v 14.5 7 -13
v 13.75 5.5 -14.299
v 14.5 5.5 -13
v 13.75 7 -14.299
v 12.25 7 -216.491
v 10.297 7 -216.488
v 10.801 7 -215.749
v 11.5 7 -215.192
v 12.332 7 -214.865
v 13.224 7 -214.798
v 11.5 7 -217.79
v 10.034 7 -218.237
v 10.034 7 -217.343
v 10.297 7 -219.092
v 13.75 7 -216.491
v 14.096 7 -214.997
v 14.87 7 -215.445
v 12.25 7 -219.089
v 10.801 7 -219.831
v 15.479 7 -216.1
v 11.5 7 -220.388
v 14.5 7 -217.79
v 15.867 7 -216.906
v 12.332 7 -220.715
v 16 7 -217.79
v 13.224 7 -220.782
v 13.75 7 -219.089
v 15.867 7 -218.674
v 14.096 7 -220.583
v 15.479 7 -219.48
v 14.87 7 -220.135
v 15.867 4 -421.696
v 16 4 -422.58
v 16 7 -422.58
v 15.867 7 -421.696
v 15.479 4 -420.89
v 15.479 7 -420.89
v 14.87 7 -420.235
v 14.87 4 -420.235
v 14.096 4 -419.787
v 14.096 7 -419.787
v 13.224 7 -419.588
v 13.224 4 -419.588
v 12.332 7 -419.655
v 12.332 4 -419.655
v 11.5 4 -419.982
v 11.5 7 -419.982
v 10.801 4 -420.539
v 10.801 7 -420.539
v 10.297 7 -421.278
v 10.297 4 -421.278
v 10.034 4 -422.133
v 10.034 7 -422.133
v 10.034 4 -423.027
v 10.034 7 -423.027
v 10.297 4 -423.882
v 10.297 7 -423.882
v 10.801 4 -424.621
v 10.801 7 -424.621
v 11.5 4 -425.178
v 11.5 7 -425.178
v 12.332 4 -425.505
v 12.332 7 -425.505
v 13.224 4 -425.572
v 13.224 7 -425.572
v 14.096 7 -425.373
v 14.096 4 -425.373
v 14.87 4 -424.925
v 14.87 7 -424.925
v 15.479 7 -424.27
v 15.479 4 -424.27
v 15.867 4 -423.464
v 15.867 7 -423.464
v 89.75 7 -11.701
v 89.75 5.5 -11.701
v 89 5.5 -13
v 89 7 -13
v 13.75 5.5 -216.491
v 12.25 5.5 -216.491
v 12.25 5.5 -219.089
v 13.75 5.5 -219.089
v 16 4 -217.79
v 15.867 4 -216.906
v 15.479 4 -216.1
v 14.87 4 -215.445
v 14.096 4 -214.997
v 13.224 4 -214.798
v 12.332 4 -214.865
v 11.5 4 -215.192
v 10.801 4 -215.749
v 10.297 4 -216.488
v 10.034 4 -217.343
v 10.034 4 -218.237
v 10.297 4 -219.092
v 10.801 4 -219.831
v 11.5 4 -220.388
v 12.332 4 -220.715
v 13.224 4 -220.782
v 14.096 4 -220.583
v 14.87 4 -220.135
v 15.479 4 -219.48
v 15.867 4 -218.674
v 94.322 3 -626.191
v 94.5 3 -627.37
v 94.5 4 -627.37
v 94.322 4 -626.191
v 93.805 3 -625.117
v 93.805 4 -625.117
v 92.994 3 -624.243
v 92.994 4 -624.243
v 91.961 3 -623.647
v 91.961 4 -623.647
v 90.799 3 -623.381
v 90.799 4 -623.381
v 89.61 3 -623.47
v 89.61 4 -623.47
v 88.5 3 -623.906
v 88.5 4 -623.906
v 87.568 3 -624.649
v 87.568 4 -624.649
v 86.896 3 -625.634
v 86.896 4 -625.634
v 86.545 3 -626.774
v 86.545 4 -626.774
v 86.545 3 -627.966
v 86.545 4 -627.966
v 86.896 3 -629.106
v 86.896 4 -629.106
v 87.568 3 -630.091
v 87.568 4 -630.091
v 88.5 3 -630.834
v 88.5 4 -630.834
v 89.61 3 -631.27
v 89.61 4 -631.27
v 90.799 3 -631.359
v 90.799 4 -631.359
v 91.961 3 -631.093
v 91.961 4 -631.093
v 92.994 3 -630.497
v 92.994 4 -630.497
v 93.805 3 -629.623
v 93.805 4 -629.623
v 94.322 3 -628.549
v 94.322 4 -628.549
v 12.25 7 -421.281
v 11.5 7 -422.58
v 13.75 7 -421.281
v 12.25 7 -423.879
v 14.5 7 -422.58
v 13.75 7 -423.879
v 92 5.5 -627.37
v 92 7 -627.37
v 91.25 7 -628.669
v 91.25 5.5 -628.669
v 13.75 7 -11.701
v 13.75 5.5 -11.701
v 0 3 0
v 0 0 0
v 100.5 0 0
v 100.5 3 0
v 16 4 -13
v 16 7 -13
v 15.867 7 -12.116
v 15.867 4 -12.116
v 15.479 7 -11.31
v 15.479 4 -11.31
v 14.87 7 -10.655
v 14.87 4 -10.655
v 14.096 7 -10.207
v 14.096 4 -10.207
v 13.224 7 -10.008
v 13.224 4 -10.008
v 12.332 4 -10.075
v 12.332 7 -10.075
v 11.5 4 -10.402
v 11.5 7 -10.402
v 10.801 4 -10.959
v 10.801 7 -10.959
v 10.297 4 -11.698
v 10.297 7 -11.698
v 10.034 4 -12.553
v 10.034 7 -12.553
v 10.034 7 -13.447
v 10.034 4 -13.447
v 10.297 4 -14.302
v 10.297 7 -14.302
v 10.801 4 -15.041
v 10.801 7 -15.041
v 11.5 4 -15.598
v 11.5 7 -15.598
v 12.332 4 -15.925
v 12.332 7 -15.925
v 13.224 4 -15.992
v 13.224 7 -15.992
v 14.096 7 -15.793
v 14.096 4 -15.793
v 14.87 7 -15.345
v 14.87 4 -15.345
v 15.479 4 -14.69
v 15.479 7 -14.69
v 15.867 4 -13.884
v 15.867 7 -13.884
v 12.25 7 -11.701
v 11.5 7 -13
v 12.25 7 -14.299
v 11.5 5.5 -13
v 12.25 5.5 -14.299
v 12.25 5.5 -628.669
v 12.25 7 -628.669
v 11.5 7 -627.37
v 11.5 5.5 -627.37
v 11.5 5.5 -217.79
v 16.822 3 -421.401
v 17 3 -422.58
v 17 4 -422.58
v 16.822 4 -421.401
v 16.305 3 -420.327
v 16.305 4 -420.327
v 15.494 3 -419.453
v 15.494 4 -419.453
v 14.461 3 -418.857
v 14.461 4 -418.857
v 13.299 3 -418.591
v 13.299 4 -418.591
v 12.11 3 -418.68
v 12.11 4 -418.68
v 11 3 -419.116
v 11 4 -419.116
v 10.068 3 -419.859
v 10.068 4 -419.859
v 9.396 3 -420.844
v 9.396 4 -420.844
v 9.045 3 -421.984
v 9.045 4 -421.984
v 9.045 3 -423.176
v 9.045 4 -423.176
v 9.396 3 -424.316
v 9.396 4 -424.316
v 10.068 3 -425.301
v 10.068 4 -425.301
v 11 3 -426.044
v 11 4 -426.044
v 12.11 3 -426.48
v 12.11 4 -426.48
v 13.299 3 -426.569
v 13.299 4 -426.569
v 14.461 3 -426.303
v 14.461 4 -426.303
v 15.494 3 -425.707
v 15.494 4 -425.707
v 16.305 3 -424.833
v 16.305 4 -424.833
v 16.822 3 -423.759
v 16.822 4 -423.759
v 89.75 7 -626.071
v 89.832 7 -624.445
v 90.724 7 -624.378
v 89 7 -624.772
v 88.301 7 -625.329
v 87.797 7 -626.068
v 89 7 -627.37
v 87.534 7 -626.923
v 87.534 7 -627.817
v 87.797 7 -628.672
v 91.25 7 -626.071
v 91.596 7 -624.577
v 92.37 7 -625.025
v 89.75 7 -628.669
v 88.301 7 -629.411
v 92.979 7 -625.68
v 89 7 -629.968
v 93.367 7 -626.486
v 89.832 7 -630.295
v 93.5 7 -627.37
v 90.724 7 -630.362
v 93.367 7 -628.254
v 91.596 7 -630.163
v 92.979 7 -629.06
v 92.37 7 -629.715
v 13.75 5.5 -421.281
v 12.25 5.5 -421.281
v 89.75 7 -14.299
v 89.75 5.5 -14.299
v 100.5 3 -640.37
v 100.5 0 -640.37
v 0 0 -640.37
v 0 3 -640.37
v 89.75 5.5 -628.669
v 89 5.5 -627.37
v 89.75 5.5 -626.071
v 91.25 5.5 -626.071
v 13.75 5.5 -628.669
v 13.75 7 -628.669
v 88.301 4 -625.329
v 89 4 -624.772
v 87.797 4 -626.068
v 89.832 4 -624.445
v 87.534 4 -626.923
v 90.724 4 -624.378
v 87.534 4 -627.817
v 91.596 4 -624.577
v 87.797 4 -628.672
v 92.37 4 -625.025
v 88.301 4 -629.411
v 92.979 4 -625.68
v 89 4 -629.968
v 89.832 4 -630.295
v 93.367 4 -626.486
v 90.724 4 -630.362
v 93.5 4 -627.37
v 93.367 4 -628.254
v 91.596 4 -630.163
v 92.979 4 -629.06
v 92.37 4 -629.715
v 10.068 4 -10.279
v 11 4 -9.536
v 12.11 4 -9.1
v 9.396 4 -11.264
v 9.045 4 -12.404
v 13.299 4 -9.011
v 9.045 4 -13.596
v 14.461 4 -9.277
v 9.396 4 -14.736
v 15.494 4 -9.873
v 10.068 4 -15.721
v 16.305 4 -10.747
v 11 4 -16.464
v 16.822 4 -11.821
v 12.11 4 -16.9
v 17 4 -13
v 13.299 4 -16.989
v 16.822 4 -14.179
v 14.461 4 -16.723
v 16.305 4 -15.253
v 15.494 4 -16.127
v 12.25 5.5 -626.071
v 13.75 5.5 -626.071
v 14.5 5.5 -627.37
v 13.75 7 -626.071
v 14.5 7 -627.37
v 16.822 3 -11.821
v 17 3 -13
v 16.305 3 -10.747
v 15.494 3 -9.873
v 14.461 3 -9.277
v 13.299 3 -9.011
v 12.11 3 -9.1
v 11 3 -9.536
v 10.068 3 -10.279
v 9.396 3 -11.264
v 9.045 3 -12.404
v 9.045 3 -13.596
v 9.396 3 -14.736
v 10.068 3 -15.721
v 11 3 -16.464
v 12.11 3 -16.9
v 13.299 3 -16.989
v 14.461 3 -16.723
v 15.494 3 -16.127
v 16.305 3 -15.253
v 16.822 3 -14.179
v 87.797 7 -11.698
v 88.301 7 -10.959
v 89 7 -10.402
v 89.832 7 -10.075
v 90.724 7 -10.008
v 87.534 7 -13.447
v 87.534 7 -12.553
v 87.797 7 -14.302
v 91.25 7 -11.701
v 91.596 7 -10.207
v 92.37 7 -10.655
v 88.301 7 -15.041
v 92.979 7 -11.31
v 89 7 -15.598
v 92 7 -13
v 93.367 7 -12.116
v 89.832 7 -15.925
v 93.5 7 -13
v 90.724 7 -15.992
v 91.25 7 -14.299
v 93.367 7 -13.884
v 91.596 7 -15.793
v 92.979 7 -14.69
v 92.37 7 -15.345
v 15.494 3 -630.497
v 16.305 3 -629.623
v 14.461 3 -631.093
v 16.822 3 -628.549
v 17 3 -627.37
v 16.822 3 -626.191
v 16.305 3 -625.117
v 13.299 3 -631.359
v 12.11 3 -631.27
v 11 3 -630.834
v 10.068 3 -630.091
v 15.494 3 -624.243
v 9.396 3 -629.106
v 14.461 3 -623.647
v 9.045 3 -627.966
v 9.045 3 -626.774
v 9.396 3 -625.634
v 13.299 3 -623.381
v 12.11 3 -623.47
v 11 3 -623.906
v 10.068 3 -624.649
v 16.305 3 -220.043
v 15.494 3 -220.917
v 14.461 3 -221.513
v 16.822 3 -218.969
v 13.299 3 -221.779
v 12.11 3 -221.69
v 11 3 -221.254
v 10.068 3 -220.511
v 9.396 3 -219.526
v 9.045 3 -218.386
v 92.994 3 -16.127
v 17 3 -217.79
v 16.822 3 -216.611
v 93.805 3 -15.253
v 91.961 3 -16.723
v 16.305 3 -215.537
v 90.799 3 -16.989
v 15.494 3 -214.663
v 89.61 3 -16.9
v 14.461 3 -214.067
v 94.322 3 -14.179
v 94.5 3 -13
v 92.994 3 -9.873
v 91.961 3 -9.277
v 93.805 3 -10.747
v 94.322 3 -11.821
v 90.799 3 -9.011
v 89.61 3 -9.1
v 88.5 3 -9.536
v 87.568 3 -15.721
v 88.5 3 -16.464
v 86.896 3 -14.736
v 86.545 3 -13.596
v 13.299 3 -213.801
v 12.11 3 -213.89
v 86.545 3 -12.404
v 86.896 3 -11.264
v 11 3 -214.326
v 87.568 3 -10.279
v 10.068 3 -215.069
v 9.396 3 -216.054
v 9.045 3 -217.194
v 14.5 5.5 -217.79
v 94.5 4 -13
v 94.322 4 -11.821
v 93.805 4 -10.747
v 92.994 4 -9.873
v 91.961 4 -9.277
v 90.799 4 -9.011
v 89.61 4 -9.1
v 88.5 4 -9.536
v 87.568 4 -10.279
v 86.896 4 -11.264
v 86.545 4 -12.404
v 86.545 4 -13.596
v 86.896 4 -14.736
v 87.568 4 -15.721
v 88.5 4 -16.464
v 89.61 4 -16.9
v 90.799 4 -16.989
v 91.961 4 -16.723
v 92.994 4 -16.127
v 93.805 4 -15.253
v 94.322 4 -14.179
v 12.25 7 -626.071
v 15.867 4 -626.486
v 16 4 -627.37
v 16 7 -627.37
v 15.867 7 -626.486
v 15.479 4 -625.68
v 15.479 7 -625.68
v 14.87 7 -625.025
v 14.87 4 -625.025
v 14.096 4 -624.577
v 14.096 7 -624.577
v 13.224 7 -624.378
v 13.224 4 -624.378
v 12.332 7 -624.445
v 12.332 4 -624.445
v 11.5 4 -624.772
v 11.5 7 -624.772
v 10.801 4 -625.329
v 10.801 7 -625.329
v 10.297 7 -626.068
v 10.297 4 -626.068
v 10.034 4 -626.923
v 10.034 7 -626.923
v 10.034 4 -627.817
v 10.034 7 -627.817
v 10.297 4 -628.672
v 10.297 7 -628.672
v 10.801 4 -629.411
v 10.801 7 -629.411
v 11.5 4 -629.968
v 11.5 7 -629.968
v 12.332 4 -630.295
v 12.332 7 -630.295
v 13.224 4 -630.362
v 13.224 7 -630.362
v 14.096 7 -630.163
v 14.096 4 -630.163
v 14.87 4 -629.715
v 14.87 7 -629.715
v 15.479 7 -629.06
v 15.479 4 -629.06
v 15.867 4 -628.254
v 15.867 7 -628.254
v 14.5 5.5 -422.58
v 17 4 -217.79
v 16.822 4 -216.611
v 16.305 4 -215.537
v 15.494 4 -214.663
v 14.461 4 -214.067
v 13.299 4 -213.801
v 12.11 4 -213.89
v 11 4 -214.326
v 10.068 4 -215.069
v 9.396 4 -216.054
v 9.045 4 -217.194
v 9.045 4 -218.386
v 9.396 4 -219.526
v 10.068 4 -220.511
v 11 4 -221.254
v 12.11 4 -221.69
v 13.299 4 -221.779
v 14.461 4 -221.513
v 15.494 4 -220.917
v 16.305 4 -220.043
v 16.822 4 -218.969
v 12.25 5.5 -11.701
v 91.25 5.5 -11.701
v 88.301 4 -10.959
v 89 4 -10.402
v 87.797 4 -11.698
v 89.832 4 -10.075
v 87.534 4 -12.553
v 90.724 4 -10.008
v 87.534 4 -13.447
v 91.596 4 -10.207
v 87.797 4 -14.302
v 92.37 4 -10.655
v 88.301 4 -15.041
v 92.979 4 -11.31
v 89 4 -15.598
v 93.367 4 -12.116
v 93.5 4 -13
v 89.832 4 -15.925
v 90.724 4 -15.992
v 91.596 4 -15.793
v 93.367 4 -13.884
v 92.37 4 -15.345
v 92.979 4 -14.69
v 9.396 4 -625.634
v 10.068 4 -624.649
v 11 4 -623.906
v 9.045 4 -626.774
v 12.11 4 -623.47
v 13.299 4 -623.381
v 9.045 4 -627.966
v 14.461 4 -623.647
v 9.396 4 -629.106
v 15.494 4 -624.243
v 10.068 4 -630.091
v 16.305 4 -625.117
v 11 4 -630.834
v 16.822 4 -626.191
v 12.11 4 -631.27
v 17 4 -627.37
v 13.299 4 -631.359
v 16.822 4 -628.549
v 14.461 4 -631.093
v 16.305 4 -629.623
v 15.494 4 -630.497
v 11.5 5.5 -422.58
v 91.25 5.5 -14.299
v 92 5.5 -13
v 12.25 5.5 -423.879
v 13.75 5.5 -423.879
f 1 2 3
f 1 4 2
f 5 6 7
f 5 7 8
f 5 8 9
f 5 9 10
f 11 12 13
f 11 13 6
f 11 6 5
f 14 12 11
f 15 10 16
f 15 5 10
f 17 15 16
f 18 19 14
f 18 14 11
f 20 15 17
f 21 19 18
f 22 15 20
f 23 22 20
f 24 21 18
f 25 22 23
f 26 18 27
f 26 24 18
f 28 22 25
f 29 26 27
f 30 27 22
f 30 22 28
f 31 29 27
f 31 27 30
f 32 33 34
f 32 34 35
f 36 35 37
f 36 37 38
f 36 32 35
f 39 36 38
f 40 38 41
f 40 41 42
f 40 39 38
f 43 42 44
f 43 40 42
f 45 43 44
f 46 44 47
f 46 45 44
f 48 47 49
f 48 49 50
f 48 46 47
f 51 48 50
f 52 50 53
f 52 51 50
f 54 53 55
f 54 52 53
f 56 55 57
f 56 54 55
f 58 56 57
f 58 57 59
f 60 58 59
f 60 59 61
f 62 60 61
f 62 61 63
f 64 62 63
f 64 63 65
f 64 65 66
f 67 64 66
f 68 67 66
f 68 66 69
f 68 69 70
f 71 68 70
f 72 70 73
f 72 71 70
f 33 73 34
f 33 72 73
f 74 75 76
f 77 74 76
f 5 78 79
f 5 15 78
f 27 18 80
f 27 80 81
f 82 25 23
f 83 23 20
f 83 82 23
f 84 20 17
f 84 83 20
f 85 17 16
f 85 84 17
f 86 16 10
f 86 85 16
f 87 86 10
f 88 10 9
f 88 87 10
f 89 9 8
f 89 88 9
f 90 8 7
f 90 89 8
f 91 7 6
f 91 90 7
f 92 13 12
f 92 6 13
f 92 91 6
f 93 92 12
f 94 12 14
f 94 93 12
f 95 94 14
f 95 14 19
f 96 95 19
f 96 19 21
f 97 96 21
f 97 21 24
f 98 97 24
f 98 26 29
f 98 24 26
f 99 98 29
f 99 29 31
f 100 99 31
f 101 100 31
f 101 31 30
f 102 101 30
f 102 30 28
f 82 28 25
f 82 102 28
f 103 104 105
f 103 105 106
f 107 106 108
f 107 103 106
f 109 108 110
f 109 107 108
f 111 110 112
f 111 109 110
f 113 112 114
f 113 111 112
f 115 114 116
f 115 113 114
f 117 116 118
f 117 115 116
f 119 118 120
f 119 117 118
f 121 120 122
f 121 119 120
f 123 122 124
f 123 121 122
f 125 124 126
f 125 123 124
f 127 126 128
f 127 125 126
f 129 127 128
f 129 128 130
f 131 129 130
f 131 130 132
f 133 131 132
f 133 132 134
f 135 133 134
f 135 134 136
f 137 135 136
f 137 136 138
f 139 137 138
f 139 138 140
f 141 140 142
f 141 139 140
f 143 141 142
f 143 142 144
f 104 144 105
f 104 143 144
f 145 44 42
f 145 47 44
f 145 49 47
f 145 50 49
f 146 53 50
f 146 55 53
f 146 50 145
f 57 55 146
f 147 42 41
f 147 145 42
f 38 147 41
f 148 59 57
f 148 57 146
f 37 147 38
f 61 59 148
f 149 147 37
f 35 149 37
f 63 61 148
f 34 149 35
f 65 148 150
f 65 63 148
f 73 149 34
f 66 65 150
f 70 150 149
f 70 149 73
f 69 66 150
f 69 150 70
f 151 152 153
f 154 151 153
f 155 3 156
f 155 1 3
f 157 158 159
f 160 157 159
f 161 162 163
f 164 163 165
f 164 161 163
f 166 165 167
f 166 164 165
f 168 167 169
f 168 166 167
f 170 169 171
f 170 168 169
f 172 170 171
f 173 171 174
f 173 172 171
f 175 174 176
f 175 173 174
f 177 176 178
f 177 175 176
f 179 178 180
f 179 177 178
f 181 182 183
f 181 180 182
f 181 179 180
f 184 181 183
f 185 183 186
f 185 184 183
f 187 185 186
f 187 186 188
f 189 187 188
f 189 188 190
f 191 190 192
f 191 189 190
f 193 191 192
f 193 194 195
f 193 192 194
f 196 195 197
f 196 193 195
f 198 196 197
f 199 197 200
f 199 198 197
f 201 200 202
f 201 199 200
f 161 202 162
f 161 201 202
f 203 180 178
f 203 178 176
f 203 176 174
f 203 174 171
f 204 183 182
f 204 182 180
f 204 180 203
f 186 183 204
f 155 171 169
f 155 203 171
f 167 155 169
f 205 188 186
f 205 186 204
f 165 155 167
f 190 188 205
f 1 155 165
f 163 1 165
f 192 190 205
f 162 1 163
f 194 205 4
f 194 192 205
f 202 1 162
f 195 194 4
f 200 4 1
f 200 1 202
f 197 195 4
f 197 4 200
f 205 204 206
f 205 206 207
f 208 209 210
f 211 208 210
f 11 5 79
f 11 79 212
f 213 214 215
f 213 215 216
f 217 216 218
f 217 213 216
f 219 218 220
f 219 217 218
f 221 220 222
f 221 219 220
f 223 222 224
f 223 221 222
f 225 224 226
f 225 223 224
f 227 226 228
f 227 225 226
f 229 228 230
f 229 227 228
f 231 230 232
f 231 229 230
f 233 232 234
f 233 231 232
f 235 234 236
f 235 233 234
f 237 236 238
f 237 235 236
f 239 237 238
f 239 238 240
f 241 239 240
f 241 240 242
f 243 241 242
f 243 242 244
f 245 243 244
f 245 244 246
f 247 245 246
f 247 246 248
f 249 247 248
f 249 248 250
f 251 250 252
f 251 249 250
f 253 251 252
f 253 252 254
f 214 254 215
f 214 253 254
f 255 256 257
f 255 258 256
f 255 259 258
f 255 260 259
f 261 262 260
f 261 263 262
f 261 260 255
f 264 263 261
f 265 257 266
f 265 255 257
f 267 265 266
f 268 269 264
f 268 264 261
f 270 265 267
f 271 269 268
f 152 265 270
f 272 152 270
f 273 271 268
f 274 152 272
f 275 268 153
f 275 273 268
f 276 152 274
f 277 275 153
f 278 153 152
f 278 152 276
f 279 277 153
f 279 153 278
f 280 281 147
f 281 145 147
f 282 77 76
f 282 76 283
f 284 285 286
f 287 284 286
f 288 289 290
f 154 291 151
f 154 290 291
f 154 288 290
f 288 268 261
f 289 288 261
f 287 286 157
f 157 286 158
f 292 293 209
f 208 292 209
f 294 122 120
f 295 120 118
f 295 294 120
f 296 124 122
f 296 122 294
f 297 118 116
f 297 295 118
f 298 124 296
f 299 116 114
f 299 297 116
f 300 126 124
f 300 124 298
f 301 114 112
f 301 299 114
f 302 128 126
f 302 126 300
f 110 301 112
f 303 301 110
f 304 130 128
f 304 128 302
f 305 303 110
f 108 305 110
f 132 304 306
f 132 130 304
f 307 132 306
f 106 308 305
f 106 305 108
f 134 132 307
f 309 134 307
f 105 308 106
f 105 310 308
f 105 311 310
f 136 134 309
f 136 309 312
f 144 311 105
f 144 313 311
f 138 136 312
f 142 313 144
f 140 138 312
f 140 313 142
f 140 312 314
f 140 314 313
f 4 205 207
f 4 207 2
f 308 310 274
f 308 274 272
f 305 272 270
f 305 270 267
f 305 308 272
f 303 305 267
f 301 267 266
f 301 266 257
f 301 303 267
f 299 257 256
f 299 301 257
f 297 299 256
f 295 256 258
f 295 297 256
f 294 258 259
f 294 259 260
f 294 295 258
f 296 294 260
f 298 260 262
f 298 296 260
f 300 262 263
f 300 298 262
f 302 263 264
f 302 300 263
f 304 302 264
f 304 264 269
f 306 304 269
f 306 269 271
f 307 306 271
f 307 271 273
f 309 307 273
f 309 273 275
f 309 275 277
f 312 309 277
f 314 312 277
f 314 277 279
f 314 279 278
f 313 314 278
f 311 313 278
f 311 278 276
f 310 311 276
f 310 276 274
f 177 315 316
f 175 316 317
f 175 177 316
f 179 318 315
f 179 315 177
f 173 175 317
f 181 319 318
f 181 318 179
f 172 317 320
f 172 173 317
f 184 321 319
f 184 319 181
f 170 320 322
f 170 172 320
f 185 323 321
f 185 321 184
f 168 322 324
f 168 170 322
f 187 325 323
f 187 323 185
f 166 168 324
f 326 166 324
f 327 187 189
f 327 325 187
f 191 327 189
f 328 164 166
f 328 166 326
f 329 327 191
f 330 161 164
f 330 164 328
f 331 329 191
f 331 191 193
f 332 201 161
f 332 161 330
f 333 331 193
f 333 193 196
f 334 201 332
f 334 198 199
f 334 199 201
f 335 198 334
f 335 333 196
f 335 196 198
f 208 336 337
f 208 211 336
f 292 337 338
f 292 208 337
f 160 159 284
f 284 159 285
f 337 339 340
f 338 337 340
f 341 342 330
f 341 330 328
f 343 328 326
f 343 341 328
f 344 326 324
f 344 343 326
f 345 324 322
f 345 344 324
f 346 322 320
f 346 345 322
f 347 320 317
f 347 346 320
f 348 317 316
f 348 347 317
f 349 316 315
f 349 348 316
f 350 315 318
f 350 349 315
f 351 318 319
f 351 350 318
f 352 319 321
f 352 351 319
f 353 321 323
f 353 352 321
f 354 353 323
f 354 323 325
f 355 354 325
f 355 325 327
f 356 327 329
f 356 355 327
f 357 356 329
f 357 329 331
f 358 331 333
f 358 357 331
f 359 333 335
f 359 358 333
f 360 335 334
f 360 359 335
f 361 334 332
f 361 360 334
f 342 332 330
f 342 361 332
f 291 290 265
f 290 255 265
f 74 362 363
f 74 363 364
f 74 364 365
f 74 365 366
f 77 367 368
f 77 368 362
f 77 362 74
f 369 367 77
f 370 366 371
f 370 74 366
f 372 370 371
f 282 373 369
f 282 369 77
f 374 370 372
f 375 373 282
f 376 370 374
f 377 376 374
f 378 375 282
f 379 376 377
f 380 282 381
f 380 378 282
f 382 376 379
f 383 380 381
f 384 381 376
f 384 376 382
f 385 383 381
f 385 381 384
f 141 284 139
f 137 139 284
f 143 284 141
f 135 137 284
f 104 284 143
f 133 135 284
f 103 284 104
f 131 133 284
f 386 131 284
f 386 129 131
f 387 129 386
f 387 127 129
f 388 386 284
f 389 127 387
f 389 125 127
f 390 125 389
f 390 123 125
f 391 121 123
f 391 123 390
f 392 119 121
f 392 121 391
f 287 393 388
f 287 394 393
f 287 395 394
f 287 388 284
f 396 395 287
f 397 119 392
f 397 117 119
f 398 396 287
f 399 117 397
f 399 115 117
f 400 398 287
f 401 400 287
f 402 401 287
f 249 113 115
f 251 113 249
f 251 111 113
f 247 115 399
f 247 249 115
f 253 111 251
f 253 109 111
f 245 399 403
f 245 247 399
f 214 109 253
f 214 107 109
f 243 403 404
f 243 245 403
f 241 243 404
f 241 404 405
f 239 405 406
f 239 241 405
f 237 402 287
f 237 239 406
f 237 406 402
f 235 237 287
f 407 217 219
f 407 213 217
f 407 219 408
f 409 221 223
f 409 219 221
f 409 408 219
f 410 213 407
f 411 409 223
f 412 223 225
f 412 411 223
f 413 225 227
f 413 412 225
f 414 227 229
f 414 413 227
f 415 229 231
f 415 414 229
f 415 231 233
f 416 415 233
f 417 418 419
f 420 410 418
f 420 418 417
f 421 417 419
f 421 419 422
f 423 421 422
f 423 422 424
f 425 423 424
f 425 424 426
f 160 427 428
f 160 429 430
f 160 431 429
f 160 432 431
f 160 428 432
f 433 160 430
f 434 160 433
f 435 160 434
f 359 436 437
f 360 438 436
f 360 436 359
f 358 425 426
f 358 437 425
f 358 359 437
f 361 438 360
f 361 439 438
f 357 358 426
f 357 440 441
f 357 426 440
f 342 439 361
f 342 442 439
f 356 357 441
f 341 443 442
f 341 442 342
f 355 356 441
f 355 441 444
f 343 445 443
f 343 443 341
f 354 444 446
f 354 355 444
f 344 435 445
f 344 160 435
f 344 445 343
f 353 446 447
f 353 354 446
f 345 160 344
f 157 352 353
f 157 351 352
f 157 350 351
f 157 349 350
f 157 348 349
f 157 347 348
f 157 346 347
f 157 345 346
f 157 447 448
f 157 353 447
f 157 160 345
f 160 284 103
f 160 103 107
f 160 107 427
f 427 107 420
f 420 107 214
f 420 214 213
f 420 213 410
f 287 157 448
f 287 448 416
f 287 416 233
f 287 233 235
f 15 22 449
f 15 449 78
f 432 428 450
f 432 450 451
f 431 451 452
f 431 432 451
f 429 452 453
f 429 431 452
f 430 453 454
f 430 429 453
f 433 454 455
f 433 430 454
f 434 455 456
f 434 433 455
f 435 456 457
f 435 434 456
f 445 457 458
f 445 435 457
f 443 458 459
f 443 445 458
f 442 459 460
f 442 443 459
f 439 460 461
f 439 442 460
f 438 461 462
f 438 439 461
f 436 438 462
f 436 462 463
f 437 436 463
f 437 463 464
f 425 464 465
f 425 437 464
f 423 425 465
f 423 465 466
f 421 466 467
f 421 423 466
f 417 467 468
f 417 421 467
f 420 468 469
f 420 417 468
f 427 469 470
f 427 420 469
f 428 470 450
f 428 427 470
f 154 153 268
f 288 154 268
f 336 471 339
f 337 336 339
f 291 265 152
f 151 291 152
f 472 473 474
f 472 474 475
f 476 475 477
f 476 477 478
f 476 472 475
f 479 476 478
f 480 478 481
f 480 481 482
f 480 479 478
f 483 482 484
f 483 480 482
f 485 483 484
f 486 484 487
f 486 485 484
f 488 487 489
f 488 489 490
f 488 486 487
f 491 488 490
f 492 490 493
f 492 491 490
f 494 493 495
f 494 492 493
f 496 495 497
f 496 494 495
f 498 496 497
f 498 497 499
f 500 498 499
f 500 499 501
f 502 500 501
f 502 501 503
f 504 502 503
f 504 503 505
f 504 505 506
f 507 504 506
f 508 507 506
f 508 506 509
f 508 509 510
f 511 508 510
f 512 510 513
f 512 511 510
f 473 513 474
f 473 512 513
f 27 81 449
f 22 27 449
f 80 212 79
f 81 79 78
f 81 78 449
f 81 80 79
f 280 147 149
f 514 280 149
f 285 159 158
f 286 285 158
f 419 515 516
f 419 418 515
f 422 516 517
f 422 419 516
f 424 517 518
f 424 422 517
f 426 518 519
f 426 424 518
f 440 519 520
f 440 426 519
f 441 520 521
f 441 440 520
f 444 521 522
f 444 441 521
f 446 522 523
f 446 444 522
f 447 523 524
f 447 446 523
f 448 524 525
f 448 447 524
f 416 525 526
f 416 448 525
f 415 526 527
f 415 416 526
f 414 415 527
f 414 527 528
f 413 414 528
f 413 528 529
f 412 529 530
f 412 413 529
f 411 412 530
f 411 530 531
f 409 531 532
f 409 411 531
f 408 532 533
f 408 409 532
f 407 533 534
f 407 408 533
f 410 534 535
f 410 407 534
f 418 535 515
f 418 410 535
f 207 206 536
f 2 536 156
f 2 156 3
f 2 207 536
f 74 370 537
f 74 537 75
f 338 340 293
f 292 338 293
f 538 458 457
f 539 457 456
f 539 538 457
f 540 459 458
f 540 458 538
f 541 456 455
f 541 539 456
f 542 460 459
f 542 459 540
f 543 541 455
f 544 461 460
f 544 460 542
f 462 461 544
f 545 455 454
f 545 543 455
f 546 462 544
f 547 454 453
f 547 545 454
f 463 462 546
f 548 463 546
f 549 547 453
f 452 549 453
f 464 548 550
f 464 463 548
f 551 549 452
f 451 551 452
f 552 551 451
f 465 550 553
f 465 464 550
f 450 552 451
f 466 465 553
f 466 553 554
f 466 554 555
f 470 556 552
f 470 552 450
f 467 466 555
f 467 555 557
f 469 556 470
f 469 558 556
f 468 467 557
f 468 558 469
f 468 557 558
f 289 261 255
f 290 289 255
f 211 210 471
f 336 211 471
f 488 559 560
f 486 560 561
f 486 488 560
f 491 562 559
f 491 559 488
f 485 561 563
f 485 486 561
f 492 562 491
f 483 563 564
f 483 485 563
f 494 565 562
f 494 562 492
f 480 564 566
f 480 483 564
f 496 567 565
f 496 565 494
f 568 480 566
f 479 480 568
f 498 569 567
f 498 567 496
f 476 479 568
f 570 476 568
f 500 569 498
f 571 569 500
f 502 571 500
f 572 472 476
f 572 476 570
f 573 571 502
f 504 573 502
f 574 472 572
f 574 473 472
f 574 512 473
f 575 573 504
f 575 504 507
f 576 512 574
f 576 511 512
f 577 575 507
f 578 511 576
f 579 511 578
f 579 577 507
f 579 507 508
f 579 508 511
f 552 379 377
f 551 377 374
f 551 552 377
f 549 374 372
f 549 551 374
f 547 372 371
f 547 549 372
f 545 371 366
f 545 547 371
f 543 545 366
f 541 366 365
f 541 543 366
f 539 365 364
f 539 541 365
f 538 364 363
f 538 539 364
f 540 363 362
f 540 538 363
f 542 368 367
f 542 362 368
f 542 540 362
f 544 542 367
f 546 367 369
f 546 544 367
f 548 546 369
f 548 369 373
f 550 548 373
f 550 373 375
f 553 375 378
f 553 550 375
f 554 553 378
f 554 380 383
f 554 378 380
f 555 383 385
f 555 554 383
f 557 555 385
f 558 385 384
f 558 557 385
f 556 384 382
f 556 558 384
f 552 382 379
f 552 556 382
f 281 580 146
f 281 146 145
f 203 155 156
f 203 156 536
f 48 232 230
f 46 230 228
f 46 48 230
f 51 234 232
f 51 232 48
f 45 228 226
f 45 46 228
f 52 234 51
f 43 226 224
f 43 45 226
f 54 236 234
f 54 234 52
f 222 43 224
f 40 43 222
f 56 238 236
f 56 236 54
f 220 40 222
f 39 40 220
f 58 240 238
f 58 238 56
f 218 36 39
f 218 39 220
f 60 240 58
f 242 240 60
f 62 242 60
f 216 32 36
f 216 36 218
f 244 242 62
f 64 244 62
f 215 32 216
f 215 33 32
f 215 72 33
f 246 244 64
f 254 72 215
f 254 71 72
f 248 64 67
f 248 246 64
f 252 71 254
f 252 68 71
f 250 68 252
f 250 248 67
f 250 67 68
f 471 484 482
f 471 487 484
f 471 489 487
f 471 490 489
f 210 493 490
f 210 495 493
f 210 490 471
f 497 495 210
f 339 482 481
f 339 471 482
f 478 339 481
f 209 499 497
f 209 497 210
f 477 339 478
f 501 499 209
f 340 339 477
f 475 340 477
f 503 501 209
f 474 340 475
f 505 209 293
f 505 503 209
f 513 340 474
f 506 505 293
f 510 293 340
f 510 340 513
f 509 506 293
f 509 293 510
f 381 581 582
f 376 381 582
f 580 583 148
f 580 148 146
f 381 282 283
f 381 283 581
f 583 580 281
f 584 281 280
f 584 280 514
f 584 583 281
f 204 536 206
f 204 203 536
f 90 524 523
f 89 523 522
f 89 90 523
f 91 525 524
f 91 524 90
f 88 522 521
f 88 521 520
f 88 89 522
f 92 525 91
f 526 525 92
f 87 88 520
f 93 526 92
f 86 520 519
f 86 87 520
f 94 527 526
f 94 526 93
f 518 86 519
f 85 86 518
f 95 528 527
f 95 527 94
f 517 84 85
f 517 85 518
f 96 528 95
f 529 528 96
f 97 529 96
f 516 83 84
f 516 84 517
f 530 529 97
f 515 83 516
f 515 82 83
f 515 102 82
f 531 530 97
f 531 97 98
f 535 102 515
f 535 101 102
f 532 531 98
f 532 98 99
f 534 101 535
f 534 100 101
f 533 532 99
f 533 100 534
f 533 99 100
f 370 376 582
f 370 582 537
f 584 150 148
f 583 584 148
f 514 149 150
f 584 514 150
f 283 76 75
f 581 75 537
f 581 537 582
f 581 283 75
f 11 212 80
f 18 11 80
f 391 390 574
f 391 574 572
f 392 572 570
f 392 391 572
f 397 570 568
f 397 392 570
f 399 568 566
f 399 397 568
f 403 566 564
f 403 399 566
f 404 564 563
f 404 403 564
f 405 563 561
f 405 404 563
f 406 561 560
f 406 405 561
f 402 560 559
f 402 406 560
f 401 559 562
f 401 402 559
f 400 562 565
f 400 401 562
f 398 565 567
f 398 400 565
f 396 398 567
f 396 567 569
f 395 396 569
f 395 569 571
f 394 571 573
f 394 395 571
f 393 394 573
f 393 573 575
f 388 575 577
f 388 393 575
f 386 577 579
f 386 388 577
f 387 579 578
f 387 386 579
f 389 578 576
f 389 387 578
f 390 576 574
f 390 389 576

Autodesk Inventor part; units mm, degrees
ref_plane "YZ Plane" through (0, 0, 0) normal (1, 0, 0) x (0, 1, 0)
ref_plane "XZ Plane" through (0, 0, 0) normal (0, 1, 0) x (-1, 0, 0)
ref_plane "XY Plane" through (0, 0, 0) normal (0, 0, 1) x (1, 0, 0)
sketch "Esboço1" plane through (0, 0, 0) normal (0, 1, 0) x (-1, 0, 0)
  line L0 (0, 0) -> (-100.5, 0)
  line L1 (-100.5, 0) -> (-100.5, -640.37)
  line L2 (-100.5, -640.37) -> (0, -640.37)
  line L3 (0, -640.37) -> (0, 0)
  dimension "d0" = 100.5
  dimension "d1" = 640.37
extrude "Extrusão1" add sketch "Esboço1" along normal blind 3
sketch "Esboço2" plane through (0, 3, 0) normal (0, 1, 0) x (1, 0, 0)
  line L0 (0, 0) -> (100.5, 0) projected
  line L1 (0, 0) -> (100.5, 0)
  line L2 (0, 20) -> (0, 0)
  line L3 (100.5, 640.37) -> (0, 640.37) projected
  line L4 (0, 0) -> (23, 0)
  line L5 (23, 0) -> (23, 640.37)
  line L6 (23, 640.37) -> (0, 640.37)
  line L7 (0, 640.37) -> (0, 0)
  line L8 (0, 640.37) -> (3, 640.37)
  line L9 (3, 640.37) -> (3, 0)
  line L10 (3, 0) -> (0, 0)
  line L11 (0, 0) -> (0, 640.37)
  line L12 (100.5, 0) -> (100.5, 640.37) projected
  line L13 (0, 0) -> (100.5, 0)
  line L14 (100.5, 0) -> (100.5, 23)
  line L15 (100.5, 23) -> (0, 23)
  line L16 (0, 23) -> (0, 0)
  line L17 (0, 23) -> (100.5, 23)
  line L18 (100.5, 23) -> (100.5, 3)
  line L19 (100.5, 3) -> (0, 3)
  line L20 (0, 3) -> (0, 23)
  line L21 (0, 640.37) -> (100.5, 640.37)
  line L22 (100.5, 640.37) -> (100.5, 617.37)
  line L23 (100.5, 617.37) -> (0, 617.37)
  line L24 (0, 617.37) -> (0, 640.37)
  line L25 (0, 617.37) -> (100.5, 617.37)
  line L26 (100.5, 617.37) -> (100.5, 637.37)
  line L27 (100.5, 637.37) -> (0, 637.37)
  line L28 (0, 637.37) -> (0, 617.37)
  line L29 (3, 617.37) -> (13, 617.37)
  line L30 (13, 617.37) -> (13, 627.37)
  line L31 (13, 627.37) -> (3, 627.37)
  line L32 (3, 627.37) -> (3, 617.37)
  line L33 (100.5, 617.37) -> (90.5, 617.37)
  line L34 (90.5, 617.37) -> (90.5, 627.37)
  line L35 (90.5, 627.37) -> (100.5, 627.37)
  line L36 (100.5, 627.37) -> (100.5, 617.37)
  line L37 (0, 320.185) -> (42.8938, 320.185)
  line L38 (0, 320.185) -> (13, 320.185)
  circle A0 centre (13, 320.185) radius 3
  circle A1 centre (13, 627.37) radius 3
  circle A2 centre (90.5, 627.37) radius 3
  line L39 (13, 320.185) -> (13, 422.58)
  line L40 (13, 422.58) -> (13, 524.975)
  circle A3 centre (13, 422.58) radius 3
  circle A4 centre (13, 524.975) radius 3
  circle A5 centre (13, 320.185) radius 3
  circle A6 centre (13, 13) radius 3
  circle A7 centre (90.5, 13) radius 3
  circle A8 centre (13, 217.79) radius 3
  circle A9 centre (13, 115.395) radius 3
  dimension "d5" = 23
  dimension "d6" = 3
  dimension "d7" = 23
  dimension "d8" = 20
  dimension "d9" = 23
  dimension "d10" = 20
  dimension "d11" = 10
  dimension "d12" = 10
  dimension "d13" = 10
  dimension "d14" = 6
  dimension "d15" = 6
  dimension "d16" = 6
  dimension "d17" = 102.395
  dimension "d18" = 102.395
extrude "Extrusão2" add sketch "Esboço2" along normal blind 4 contours A4 | A3 L40 L39 | L39 L40 A3 | A0 L39 L37 | L37 A0 | L37 L39 A0 | A1 L30 L31 | L31 L30 A1 | A2 L34 L35 | L35 L34 A2 | A6 | A7 | A8 | A9
sketch "Esboço3" plane through (0, 3, 0) normal (0, 1, 0) x (1, 0, 0)
  circle A0 centre (13, 13) radius 3 projected
  circle A1 centre (13, 13) radius 4
  circle A2 centre (90.5, 13) radius 3 projected
  circle A3 centre (90.5, 13) radius 4
  circle A4 centre (13, 115.395) radius 3 projected
  circle A5 centre (13, 115.395) radius 4
  circle A6 centre (13, 217.79) radius 3 projected
  circle A7 centre (13, 217.79) radius 4
  circle A8 centre (13, 320.185) radius 3 projected
  circle A9 centre (13, 320.185) radius 4
  line L0 (100.5, 0) -> (100.5, 640.37) projected
  line L1 (100.5, 320.185) -> (82.1081, 320.185)
  circle A10 centre (13, 627.37) radius 3
  circle A11 centre (13, 627.37) radius 4
  circle A12 centre (90.5, 627.37) radius 3
  circle A13 centre (90.5, 627.37) radius 4
  circle A14 centre (13, 524.975) radius 3
  circle A15 centre (13, 524.975) radius 4
  circle A16 centre (13, 422.58) radius 3
  circle A17 centre (13, 422.58) radius 4
  circle A18 centre (13, 320.185) radius 3
  circle A19 centre (13, 320.185) radius 4
  point P0 (0, 0)
  dimension "d21" = 8
  dimension "d22" = 8
  dimension "d23" = 8
  dimension "d24" = 8
  dimension "d25" = 8
extrude "Extrusão3" add sketch "Esboço3" along normal blind 1 contours A0 | A1 | A2 | A3 | A4 | A5 | A6 | A7 | A8 | A9 | A10 | A11 | A12 | A13 | A14 | A15 | A16 | A17
sketch "Esboço4" plane through (13, 7, -13) normal (0, 1, 0) x (1, 0, 0)
  circle A0 centre (0, 0) radius 3 projected
  line L0 (0, 0) -> (1.5, 0)
  circle A1 centre (0, 0) radius 4 projected
  line L1 (1.5, 0) -> (0.75, -1.299)
  line L2 (0.75, -1.299) -> (-0.75, -1.299)
  line L3 (-0.75, -1.299) -> (-1.5, 0)
  line L4 (-1.5, 0) -> (-0.75, 1.299)
  line L5 (-0.75, 1.299) -> (0.75, 1.299)
  line L6 (0.75, 1.299) -> (1.5, 0)
  circle A2 centre (77.5, 0) radius 3 projected
  line L7 (77.5, 0) -> (79, 0)
  line L8 (79, 0) -> (78.25, -1.299)
  line L9 (78.25, -1.299) -> (76.75, -1.299)
  line L10 (76.75, -1.299) -> (76, 0)
  line L11 (76, 0) -> (76.75, 1.299)
  line L12 (76.75, 1.299) -> (78.25, 1.299)
  line L13 (78.25, 1.299) -> (79, 0)
  circle A3 centre (0, 102.395) radius 3 projected
  line L14 (0, 102.395) -> (1.5, 102.395)
  line L15 (1.5, 102.395) -> (0.75, 101.096)
  line L16 (0.75, 101.096) -> (-0.75, 101.096)
  line L17 (-0.75, 101.096) -> (-1.5, 102.395)
  line L18 (-1.5, 102.395) -> (-0.75, 103.694)
  line L19 (-0.75, 103.694) -> (0.75, 103.694)
  line L20 (0.75, 103.694) -> (1.5, 102.395)
  circle A4 centre (0, 204.79) radius 3 projected
  line L21 (0, 204.79) -> (1.5, 204.79)
  line L22 (1.5, 204.79) -> (0.75, 203.491)
  line L23 (0.75, 203.491) -> (-0.75, 203.491)
  line L24 (-0.75, 203.491) -> (-1.5, 204.79)
  line L25 (-1.5, 204.79) -> (-0.75, 206.089)
  line L26 (-0.75, 206.089) -> (0.75, 206.089)
  line L27 (0.75, 206.089) -> (1.5, 204.79)
  circle A5 centre (0, 307.185) radius 4 projected
  line L28 (0, 307.185) -> (1.5, 307.185)
  circle A6 centre (0, 307.185) radius 3 projected
  line L29 (1.5, 307.185) -> (0.75, 305.886)
  line L30 (0.75, 305.886) -> (-0.75, 305.886)
  line L31 (-0.75, 305.886) -> (-1.5, 307.185)
  line L32 (-1.5, 307.185) -> (-0.75, 308.484)
  line L33 (-0.75, 308.484) -> (0.75, 308.484)
  line L34 (0.75, 308.484) -> (1.5, 307.185)
  line L35 (87.5, -13) -> (87.5, 627.37) projected
  line L36 (87.5, 307.185) -> (57.6178, 307.185)
  circle A7 centre (0, 614.37) radius 3
  line L37 (0, 614.37) -> (1.5, 614.37)
  circle A8 centre (0, 614.37) radius 4
  line L38 (1.5, 614.37) -> (0.75, 615.669)
  line L39 (0.75, 615.669) -> (-0.75, 615.669)
  line L40 (-0.75, 615.669) -> (-1.5, 614.37)
  line L41 (-1.5, 614.37) -> (-0.75, 613.071)
  line L42 (-0.75, 613.071) -> (0.75, 613.071)
  line L43 (0.75, 613.071) -> (1.5, 614.37)
  circle A9 centre (77.5, 614.37) radius 3
  line L44 (77.5, 614.37) -> (79, 614.37)
  line L45 (79, 614.37) -> (78.25, 615.669)
  line L46 (78.25, 615.669) -> (76.75, 615.669)
  line L47 (76.75, 615.669) -> (76, 614.37)
  line L48 (76, 614.37) -> (76.75, 613.071)
  line L49 (76.75, 613.071) -> (78.25, 613.071)
  line L50 (78.25, 613.071) -> (79, 614.37)
  circle A10 centre (0, 511.975) radius 3
  line L51 (0, 511.975) -> (1.5, 511.975)
  line L52 (1.5, 511.975) -> (0.75, 513.274)
  line L53 (0.75, 513.274) -> (-0.75, 513.274)
  line L54 (-0.75, 513.274) -> (-1.5, 511.975)
  line L55 (-1.5, 511.975) -> (-0.75, 510.676)
  line L56 (-0.75, 510.676) -> (0.75, 510.676)
  line L57 (0.75, 510.676) -> (1.5, 511.975)
  circle A11 centre (0, 409.58) radius 3
  line L58 (0, 409.58) -> (1.5, 409.58)
  line L59 (1.5, 409.58) -> (0.75, 410.879)
  line L60 (0.75, 410.879) -> (-0.75, 410.879)
  line L61 (-0.75, 410.879) -> (-1.5, 409.58)
  line L62 (-1.5, 409.58) -> (-0.75, 408.281)
  line L63 (-0.75, 408.281) -> (0.75, 408.281)
  line L64 (0.75, 408.281) -> (1.5, 409.58)
  circle A12 centre (0, 307.185) radius 4
  circle A13 centre (0, 307.185) radius 3
  line L65 (1.5, 307.185) -> (0.75, 308.484)
  line L66 (0.75, 308.484) -> (-0.75, 308.484)
  line L67 (-0.75, 308.484) -> (-1.5, 307.185)
  line L68 (-1.5, 307.185) -> (-0.75, 305.886)
  line L69 (-0.75, 305.886) -> (0.75, 305.886)
  line L70 (0.75, 305.886) -> (1.5, 307.185)
  point P0 (-13, -13)
  dimension "d28" = 1.5
  dimension "d29" = 1.5
  dimension "d30" = 1.5
extrude "Extrusão4" cut sketch "Esboço4" against normal blind 1.5 contours L1 L2 L3 L4 L5 L6 | L8 L9 L10 L11 L12 L13 | L15 L16 L17 L18 L19 L20 | L22 L23 L24 L25 L26 L27 | L29 L30 L31 L32 L33 L34 | L43 L42 L41 L40 L39 L38 | L50 L49 L48 L47 L46 L45 | L57 L56 L55 L54 L53 L52 | L64 L63 L62 L61 L60 L59
sketch "Esboço5" plane through (0, 3, 0) normal (0, 1, 0) x (1, 0, 0)
  line L0 (4.5679, 103.4306) -> (23.4921, 103.4306)
  line L1 (23.4921, 103.4306) -> (23.4921, 130.838)
  line L2 (23.4921, 130.838) -> (4.5679, 130.838)
  line L3 (4.5679, 130.838) -> (4.5679, 103.4306)
  line L4 (4.5679, 310.9443) -> (23.4921, 310.9443)
  line L5 (23.4921, 310.9443) -> (23.4921, 337.6992)
  line L6 (23.4921, 337.6992) -> (4.5679, 337.6992)
  line L7 (4.5679, 337.6992) -> (4.5679, 310.9443)
  line L8 (4.5679, 512.5849) -> (23.4921, 512.5849)
  line L9 (23.4921, 512.5849) -> (23.4921, 537.3821)
  line L10 (23.4921, 537.3821) -> (4.5679, 537.3821)
  line L11 (4.5679, 537.3821) -> (4.5679, 512.5849)
  point P0 (0, 0)
extrude "Extrusão5" cut sketch "Esboço5" along normal blind 5
properties part number "chapa_frente_esquerda"
